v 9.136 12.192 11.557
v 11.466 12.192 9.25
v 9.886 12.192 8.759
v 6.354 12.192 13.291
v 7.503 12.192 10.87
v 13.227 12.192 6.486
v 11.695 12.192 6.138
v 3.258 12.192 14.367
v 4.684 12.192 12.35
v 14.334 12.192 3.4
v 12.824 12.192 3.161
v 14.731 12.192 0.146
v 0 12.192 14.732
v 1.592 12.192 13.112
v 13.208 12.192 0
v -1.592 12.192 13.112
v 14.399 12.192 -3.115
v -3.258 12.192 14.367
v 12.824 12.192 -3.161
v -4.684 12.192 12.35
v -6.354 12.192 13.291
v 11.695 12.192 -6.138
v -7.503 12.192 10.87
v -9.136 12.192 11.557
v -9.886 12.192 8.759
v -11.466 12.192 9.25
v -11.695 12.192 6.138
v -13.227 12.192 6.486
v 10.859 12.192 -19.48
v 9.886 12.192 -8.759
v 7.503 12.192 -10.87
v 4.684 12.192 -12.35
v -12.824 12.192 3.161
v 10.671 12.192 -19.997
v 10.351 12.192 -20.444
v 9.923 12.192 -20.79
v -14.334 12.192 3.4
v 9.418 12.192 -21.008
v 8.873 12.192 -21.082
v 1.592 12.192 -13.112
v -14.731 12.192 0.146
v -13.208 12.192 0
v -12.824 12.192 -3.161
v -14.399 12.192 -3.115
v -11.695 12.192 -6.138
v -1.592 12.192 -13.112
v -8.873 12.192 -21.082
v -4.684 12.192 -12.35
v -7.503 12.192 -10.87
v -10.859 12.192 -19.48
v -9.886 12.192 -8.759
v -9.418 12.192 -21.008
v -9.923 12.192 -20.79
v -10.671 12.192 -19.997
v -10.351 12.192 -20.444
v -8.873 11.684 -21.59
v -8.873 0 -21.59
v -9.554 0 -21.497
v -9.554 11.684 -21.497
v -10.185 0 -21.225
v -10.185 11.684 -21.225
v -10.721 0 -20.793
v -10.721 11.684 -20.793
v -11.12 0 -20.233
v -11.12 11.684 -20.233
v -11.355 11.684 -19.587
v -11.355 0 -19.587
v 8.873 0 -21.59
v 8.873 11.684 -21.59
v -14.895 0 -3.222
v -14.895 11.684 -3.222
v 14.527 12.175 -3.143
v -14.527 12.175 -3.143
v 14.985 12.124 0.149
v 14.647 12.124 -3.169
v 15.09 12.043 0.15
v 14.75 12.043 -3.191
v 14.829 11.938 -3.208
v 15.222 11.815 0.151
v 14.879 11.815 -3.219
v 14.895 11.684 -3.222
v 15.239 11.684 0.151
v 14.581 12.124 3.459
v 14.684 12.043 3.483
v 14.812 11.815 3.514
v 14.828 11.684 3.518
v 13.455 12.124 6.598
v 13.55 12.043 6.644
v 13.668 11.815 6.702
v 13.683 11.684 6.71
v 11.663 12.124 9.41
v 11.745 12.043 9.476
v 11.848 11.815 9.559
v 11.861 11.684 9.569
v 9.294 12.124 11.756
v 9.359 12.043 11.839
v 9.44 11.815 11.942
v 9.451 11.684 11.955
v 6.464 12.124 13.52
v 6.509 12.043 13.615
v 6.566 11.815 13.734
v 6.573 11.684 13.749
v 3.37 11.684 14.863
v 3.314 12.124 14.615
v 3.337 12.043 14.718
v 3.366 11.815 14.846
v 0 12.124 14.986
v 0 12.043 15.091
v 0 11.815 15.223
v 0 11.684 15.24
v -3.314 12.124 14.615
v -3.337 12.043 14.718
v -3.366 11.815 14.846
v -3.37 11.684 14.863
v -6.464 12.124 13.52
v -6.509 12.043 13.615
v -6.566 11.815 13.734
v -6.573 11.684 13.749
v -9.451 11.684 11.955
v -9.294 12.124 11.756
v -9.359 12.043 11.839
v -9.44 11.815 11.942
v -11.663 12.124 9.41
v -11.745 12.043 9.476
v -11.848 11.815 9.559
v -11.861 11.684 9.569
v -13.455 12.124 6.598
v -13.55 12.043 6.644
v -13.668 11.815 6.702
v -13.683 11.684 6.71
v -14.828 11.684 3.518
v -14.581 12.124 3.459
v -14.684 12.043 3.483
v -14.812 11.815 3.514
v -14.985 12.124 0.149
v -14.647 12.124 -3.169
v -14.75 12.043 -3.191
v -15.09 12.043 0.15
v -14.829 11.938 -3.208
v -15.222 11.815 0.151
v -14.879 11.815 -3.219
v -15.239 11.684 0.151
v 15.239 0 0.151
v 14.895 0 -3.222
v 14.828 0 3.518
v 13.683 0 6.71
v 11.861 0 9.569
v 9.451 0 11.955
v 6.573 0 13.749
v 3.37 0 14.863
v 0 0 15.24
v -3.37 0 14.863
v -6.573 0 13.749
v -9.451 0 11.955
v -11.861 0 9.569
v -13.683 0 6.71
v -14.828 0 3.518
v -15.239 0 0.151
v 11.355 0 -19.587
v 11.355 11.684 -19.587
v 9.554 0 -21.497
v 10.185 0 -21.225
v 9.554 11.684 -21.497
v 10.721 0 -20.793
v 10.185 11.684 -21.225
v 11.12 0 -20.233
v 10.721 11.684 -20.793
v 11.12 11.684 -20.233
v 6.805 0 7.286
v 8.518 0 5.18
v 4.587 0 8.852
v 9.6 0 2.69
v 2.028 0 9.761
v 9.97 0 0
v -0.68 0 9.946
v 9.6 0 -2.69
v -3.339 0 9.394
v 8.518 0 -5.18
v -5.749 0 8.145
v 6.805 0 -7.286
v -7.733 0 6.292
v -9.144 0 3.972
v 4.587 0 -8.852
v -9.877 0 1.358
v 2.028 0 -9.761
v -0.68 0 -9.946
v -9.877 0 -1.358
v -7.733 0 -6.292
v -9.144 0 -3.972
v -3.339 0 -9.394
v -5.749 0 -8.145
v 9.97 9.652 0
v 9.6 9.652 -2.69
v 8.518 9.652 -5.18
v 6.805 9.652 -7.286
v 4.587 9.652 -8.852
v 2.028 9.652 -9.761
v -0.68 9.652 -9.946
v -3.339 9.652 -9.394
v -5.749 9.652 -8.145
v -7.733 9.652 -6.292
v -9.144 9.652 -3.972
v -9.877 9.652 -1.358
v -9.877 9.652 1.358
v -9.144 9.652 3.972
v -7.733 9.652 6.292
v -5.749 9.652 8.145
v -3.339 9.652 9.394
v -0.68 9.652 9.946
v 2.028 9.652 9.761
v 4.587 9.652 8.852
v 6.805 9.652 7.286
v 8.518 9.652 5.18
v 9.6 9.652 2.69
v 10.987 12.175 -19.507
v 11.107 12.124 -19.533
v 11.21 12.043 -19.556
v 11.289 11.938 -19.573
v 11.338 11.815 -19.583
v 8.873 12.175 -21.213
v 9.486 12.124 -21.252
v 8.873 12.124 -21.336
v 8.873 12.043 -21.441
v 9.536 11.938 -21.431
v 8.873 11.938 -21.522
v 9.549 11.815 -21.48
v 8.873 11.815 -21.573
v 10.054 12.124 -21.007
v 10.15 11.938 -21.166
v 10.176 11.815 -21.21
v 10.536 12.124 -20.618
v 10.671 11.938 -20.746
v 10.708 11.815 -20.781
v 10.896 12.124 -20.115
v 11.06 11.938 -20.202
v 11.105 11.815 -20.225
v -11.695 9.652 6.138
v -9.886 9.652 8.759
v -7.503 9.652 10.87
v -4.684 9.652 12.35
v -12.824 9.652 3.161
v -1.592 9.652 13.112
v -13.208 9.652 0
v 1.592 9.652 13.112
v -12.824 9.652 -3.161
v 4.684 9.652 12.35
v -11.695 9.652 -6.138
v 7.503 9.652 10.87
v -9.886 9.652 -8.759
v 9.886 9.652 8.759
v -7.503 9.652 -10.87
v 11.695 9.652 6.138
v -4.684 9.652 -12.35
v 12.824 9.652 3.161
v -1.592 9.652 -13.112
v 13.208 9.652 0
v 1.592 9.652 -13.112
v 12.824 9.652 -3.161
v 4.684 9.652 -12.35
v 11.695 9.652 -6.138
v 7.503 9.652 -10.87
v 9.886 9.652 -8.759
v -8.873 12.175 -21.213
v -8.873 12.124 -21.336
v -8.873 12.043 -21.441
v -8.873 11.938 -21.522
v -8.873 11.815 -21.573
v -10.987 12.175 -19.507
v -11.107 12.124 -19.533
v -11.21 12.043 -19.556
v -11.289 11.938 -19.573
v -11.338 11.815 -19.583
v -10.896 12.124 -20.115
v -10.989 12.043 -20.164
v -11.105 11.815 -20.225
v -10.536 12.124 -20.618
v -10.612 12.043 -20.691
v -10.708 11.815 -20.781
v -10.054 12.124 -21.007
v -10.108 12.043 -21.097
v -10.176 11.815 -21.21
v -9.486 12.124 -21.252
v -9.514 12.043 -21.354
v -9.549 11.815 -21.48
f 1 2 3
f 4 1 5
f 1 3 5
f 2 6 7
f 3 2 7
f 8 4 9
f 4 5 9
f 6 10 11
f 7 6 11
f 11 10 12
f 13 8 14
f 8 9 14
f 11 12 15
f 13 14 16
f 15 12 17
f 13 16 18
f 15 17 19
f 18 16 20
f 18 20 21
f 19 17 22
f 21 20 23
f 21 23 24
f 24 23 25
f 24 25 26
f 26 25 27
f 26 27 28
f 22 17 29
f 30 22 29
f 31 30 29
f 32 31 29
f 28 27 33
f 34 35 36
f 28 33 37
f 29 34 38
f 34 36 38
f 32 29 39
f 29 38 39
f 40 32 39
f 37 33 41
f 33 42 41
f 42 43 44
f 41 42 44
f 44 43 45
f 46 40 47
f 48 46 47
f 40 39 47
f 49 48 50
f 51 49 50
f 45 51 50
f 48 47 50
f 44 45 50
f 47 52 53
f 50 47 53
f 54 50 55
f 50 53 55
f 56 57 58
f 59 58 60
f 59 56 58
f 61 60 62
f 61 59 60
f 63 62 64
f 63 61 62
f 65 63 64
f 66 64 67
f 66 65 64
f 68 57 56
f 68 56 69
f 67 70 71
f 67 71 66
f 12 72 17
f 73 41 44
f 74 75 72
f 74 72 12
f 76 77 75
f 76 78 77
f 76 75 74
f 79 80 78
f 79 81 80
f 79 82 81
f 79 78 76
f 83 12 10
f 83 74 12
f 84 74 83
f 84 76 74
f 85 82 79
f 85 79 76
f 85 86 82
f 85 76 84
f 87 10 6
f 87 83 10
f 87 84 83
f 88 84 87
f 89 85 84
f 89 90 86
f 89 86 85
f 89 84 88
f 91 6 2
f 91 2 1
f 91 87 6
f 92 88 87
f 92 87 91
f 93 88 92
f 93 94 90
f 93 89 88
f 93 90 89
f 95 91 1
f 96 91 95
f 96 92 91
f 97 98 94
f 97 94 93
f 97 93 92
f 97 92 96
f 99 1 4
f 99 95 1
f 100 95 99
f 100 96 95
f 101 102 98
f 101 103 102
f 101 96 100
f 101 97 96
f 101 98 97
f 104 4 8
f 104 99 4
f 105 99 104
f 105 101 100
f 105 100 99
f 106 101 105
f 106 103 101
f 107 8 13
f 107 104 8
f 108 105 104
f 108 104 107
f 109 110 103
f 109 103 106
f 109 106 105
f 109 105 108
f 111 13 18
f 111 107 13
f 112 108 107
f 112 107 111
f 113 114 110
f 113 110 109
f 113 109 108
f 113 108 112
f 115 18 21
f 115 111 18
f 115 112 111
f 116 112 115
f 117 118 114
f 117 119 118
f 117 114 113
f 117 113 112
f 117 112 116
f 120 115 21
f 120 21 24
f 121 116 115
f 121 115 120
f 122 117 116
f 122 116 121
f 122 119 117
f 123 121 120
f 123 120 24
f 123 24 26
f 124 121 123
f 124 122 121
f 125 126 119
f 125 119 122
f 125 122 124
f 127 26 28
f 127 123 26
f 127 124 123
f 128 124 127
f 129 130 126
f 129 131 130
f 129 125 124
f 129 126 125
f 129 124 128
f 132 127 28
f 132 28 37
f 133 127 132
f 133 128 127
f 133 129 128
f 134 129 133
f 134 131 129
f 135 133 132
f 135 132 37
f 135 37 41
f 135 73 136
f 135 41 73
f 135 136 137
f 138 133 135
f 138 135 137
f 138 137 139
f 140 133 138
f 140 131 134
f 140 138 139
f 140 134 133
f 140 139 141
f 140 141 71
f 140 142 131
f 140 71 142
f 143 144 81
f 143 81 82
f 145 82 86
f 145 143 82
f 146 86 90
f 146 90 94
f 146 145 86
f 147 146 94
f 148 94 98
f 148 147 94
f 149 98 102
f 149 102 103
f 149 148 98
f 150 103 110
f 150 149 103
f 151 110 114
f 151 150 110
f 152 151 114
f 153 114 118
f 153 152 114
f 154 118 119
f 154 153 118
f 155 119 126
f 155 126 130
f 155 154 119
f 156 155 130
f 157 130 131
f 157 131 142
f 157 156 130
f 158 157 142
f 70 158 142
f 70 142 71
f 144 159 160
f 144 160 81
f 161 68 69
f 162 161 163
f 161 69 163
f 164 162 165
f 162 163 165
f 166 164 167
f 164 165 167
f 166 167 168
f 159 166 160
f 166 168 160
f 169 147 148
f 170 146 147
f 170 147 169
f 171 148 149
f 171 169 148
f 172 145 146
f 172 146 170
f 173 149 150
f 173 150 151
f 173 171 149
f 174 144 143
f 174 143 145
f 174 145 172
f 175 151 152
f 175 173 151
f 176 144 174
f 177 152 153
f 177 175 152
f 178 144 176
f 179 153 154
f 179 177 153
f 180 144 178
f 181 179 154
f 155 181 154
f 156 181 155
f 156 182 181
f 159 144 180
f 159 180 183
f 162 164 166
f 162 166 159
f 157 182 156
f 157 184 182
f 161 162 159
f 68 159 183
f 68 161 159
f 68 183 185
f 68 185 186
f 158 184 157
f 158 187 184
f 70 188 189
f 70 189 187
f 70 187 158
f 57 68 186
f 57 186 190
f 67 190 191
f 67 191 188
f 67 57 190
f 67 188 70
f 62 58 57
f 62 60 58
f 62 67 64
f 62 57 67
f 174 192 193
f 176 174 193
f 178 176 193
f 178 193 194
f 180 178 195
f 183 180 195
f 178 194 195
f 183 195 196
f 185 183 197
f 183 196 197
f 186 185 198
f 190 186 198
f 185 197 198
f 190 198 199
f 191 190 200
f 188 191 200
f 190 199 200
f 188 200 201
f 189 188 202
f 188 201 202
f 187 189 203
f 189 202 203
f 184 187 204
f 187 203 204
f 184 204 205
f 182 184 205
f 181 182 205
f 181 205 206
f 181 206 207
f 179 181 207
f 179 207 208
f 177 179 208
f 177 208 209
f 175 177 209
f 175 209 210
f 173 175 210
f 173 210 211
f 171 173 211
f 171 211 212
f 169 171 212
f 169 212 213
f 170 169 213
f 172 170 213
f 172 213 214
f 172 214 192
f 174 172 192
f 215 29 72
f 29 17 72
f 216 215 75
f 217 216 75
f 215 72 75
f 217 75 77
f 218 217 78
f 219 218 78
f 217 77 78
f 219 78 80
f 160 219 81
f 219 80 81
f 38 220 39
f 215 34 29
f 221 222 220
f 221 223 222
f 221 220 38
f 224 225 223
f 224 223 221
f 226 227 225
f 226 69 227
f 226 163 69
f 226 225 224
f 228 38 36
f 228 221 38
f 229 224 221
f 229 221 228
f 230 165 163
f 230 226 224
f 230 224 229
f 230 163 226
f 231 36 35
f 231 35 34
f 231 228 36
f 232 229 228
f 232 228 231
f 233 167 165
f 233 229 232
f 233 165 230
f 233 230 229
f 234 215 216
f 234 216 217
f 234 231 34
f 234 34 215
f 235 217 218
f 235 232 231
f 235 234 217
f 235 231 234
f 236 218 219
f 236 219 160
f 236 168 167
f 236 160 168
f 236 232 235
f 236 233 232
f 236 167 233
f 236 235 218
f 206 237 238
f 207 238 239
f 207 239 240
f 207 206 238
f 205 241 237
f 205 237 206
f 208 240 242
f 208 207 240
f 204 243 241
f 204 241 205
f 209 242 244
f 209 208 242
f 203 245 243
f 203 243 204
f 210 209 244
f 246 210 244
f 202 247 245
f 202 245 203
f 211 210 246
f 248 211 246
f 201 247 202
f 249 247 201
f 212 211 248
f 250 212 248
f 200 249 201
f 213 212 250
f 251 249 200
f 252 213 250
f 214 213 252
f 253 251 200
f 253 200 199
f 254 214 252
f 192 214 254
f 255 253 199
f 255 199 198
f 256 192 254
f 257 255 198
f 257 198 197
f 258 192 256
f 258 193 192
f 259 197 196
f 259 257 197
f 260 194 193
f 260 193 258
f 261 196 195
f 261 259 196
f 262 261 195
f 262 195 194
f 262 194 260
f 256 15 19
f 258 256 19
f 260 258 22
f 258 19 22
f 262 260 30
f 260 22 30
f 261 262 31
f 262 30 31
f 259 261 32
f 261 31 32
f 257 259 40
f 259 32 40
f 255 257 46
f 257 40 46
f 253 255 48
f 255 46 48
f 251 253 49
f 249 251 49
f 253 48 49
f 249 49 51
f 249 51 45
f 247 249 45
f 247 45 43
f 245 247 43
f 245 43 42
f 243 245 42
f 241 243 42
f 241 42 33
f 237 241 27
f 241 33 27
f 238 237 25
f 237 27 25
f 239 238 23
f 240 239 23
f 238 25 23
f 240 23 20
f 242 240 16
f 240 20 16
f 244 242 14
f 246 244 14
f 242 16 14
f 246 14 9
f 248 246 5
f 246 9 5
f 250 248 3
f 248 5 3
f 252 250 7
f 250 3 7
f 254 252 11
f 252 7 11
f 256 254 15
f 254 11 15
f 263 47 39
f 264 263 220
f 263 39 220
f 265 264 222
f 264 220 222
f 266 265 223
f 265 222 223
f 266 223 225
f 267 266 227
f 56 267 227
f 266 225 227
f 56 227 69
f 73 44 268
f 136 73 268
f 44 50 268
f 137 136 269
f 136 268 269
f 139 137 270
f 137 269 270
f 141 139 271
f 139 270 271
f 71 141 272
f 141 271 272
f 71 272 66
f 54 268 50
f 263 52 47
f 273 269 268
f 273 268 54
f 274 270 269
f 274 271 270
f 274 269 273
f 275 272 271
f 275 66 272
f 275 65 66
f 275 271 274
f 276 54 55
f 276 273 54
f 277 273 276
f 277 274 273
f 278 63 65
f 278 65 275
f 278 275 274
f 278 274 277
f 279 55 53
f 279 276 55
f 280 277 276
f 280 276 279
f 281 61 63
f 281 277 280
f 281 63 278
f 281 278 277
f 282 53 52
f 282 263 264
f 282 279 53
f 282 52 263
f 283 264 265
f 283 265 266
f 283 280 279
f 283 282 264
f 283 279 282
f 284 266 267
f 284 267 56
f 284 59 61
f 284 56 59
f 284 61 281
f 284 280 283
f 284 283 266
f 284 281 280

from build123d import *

# Parameters (mm, degrees)
EXTRUDE1_DEPTH = 12.192
FILLET2_R      = 2.54
FILLET1_R      = 0.508
SKETCH6_R      = 9.9695
EXTRUDE2_DEPTH = 13.192
SKETCH7_R      = 13.208
EXTRUDE3_DEPTH = 2.54


with BuildPart() as part:
    # Sketch5 → Extrude1 (new body)
    with BuildSketch(Plane(origin=(0, 0, 0), x_dir=(1, 0, 0), z_dir=(0, 1, 0))):
        with BuildLine():
            Line((-10.922, 21.59), (10.922, 21.59))
            Line((10.922, 21.59), (14.895447762, 3.222302897))
            ThreePointArc((14.895447762, 3.222302897), (0, -15.24), (-14.895447762, 3.222302897))
            Line((-14.895447762, 3.222302897), (-10.922, 21.59))
        make_face()
    extrude(amount=EXTRUDE1_DEPTH)

    # Fillet2
    fillet2_edges = [part.edges().sort_by_distance(p)[0] for p in [
        (-10.922, 6.096, -21.59),
        (10.922, 6.096, -21.59),
    ]]
    fillet(fillet2_edges, radius=FILLET2_R)

    # Fillet1
    fillet1_edges = [part.edges().sort_by_distance(p)[0] for p in [
        (13.125370945, 12.192, -11.40467669),
        (-13.125370945, 12.192, -11.40467669),
        (0, 12.192, -21.59),
        (10.467632001, 12.192, -21.026829308),
        (-10.467632001, 12.192, -21.026829308),
        (0, 12.192, 15.24),
    ]]
    fillet(fillet1_edges, radius=FILLET1_R)

    # Sketch6 → Extrude2 (cut, through all)
    with BuildSketch(Plane(origin=(0, 12.192, 0), x_dir=(1, 0, 0), z_dir=(0, 1, 0))):
        Circle(SKETCH6_R)
    extrude(amount=-EXTRUDE2_DEPTH, mode=Mode.SUBTRACT)

    # Sketch7 → Extrude3 (cut)
    with BuildSketch(Plane(origin=(0, 12.192, 0), x_dir=(1, 0, 0), z_dir=(0, 1, 0))):
        Circle(SKETCH7_R)
    extrude(amount=-EXTRUDE3_DEPTH, mode=Mode.SUBTRACT)


solid = part.part
